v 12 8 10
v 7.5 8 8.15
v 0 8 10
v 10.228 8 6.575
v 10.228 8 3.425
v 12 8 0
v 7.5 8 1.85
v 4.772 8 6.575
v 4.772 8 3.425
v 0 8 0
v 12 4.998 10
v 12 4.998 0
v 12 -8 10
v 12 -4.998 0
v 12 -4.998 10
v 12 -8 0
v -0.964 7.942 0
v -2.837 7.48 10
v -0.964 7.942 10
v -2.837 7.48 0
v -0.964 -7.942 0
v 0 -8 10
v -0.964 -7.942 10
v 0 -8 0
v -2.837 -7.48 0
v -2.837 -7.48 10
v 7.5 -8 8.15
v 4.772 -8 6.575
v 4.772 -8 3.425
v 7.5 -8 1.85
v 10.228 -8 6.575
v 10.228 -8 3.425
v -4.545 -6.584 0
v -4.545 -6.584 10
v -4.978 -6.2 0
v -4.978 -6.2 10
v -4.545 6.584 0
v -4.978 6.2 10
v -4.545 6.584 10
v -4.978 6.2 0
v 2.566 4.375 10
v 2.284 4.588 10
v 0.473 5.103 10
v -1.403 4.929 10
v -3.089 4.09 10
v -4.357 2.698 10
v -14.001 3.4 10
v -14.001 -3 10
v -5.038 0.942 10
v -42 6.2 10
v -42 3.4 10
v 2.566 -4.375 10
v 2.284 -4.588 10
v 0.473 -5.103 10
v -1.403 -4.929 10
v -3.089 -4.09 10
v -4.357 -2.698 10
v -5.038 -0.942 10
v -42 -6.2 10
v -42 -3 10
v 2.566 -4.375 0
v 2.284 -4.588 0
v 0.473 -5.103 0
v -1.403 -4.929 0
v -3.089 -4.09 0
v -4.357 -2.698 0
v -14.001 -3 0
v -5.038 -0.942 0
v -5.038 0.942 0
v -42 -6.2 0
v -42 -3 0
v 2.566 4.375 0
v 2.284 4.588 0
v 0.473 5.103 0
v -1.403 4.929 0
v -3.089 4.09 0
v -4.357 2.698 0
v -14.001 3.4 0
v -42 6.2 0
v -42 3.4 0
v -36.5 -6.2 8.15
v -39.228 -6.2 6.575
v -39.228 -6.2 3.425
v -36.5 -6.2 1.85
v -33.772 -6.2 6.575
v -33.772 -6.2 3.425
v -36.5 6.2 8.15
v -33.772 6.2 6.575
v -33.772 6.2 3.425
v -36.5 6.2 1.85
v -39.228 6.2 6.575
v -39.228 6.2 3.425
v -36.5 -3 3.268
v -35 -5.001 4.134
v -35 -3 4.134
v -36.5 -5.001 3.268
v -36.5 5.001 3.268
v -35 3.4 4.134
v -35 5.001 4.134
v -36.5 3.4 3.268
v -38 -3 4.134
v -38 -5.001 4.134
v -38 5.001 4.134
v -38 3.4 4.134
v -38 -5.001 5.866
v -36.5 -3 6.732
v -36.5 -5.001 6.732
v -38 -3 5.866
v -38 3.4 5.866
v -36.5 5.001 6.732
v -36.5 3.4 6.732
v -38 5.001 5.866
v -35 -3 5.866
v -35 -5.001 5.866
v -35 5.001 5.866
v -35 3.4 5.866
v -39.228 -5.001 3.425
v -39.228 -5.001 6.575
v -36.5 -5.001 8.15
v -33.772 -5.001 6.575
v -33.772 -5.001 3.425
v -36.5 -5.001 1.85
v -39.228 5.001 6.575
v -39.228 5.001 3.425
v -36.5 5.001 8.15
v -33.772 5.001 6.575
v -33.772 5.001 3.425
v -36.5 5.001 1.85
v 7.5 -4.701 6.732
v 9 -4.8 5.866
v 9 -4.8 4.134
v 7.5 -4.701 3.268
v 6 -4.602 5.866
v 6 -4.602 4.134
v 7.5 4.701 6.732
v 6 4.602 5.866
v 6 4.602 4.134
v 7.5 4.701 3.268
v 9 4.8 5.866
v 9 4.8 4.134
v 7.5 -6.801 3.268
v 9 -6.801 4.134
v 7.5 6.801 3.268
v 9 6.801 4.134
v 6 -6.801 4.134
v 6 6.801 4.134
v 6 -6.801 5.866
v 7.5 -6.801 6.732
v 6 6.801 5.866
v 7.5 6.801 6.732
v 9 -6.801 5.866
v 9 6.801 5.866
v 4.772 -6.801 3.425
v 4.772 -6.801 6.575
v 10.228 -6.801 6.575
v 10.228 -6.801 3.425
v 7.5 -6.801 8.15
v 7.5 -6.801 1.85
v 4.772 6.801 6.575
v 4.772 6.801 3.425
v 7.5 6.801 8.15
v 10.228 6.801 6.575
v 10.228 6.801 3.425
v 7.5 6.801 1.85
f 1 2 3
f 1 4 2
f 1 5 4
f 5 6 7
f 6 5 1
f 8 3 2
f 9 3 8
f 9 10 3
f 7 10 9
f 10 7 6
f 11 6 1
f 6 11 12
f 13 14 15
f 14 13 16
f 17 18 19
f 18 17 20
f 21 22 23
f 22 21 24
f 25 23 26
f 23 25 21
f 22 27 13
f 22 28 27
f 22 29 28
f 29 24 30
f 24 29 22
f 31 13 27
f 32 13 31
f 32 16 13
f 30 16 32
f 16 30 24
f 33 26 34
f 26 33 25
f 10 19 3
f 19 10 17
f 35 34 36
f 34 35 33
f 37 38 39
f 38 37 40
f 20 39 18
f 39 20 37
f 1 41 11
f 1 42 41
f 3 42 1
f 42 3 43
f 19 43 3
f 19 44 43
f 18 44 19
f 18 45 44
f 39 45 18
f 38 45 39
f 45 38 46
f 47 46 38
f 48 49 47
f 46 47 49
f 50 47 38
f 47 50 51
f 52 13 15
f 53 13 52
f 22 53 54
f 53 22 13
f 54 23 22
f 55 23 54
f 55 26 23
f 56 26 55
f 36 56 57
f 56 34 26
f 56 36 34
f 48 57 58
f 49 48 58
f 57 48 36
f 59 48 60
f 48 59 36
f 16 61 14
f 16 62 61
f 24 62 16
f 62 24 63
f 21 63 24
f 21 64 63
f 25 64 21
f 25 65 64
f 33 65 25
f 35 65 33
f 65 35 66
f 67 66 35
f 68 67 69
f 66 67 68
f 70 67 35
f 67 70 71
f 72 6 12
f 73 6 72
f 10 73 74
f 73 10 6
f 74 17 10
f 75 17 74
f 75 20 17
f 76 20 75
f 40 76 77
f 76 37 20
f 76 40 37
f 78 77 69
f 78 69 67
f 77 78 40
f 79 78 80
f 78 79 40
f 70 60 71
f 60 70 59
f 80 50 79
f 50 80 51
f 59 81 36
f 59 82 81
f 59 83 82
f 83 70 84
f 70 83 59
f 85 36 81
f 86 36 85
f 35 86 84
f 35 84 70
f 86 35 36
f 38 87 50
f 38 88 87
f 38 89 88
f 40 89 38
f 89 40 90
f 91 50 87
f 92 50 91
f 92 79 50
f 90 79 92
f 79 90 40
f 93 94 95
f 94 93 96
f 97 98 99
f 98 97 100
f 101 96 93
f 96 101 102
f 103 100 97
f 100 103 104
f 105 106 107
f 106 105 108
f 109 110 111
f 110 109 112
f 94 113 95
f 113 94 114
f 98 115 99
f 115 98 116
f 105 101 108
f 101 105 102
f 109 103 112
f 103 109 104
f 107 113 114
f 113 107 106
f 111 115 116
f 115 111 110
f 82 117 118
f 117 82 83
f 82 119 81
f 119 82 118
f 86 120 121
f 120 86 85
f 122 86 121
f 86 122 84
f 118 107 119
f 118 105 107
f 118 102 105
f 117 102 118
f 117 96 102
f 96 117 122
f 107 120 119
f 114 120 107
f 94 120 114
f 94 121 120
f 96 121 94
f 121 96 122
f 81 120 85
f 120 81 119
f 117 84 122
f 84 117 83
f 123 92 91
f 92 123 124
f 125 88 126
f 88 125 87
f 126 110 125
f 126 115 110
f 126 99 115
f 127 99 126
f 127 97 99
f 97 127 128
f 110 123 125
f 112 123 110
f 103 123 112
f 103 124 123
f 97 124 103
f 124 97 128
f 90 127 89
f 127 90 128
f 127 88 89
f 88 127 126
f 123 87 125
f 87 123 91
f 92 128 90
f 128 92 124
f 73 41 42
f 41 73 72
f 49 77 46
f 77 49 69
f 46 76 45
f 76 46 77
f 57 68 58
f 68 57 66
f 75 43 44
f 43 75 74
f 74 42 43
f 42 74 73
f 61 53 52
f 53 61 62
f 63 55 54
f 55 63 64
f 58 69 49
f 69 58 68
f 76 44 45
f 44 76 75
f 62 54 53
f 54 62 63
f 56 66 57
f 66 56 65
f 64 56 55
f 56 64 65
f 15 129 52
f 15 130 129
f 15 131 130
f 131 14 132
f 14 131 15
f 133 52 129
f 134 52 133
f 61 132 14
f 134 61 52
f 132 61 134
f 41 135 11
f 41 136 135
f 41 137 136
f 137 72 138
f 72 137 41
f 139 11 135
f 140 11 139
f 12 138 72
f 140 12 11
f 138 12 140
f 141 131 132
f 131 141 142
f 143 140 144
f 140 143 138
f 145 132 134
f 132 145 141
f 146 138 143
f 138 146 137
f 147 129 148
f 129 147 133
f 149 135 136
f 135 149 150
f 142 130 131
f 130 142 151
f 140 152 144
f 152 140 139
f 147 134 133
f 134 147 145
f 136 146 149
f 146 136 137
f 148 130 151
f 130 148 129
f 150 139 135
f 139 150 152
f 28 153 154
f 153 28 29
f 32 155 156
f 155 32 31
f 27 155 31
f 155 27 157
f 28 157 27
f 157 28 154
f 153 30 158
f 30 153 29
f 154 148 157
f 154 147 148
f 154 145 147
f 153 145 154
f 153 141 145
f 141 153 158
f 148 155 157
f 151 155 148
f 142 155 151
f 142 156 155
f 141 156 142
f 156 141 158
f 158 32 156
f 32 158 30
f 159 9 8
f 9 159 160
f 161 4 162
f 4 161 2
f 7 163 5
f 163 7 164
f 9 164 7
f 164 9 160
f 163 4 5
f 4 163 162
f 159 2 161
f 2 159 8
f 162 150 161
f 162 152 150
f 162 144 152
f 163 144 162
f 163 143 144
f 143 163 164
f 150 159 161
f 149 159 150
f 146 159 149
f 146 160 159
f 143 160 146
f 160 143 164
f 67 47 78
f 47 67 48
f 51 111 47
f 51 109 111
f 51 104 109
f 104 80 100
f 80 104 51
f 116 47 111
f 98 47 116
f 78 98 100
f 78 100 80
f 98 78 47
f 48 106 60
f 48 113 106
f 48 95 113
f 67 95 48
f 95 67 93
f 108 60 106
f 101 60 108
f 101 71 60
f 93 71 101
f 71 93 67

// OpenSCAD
// file: common_dimensions.scad
x_rod_distance = 45;

thinwall = 3;

belt_width = 6;
belt_thickness = 1.5;

// Account for idler bearing and stepper pinion being different diameters
x_stepper_pinion_od = 12.0;
x_idler_bearing_od = 9.8; // 608 bearing
x_idler_bearing_id = 3.0; // 608 bearing
x_idler_bearing_width = 8.5; // 608 bearing
x_idler_to_stepper_offset = (x_stepper_pinion_od-x_idler_bearing_od)/2; 


// T8 NUT dimensions
t8nut_od = 22.0;
t8nut_id = 10.25; // 10.25; // 10.25 actual, 12.0 for spring on anti-backlash nut
t8nut_id_clearance = 14.0 + 3; // 
//t8nut_id = 10.2; //10.2 actual

// Z rod/bearing dimensions
z_rod_diam = 10.0; 
z_rod_diam_tight = z_rod_diam - 0.07; // Adjust diam based on test prints
z_bearing_diam = 19.0; // LM10UU
z_bearing_length = 29.0; // LM10UU

// X rod/bearing dimensions
x_rod_diam = 10.0; 
x_rod_diam_tight = x_rod_diam - 0.07; // Adjust tightness based on test prints
x_bearing_diam = 19.0; // LM10UU
x_bearing_length = 29.0; // LM10UU

z_bottom_wall_width = 5;
z_bottom_width = 43 + 2*z_bottom_wall_width;
z_bottom_height = 43;

z_top_wall_width = 5;
z_top_width = 30;
z_top_height = 22;
z_top_generate_rod_holder = false; // Optionally generate a Z rod holder, which limits the length of the Z rod, or no holder, which allows a longer Z rod to be used.

// Outer diam of Z bearing holders in X base.  

//z_bearing_size = z_bearing_diam + 2 * thinwall; // For discrete bearings, include wall to hold bearings
z_bearing_size = z_bearing_diam; // For PTFE bearings, don't need supportive walls

// Clearance required Z leadscrew to avoid interference.  Potential interference from leadscrew nut, 
// leadscrew anti-backlash spring/nut, motor/leadscrew coupler, etc.
z_leadscrew_clearance = 25+3; // Leadscrew coupler is 25mm

z_motor_ofs = z_bearing_size/2 + z_leadscrew_clearance/2; //17; // Z-motor offset from Z-rod (center-to-center) - both are aligned with X axis


x_end_belt_hole_height = x_rod_distance-x_rod_diam-2*thinwall; //31-5; // To fit between NEMA17 mounting screws
x_end_belt_hole_width = x_idler_bearing_width+0.5; // x_end_base_depth-2*thinwall; // 10;
x_end_base_height = x_rod_distance + x_rod_diam + 2*thinwall; //58 + 10;
x_end_base_depth = x_end_belt_hole_width + 2*thinwall; //18; //17; // NOTE: Manually adjust to prevent X rod cutout interference with Z linear bearing cutouts
x_end_base_width = z_bearing_size + z_leadscrew_clearance/2;
x_end_idler_open_end = true; // Specify whether x-idler end has closed ends with tension screws, or straight rod cutouts to allow longer rods.

z_rod_to_base = z_leadscrew_clearance/2; // Z-rod center offset from x-end front face
z_rod_to_rail = z_rod_to_base + x_end_base_depth + 3; // Z-rod center (and X-axis) offset from 3030 rail front face - dictated by NEMA17 stepper center (44mm / side)
z_beam_motor_ofs = 43+1-z_bottom_wall_width-25; // Z-rod center offset from Z beam center

x_to_z_offset = x_end_base_depth/2+z_rod_to_base; // 15; // Used to offset the X pushrods/belt from the Z rod.


y_rod_diam = 10.0;
y_rod_diam_tight = y_rod_diam - 0.0; // Adjust tightness based on test prints
y_rod_to_rail = 2*thinwall + y_rod_diam/2; // y rod center to 3030 rail.  11+4 from Haribo holder with 8mm rod. Use 2x thinwall to give room for ziptie hole.
y_rod_screw_diam = 3.0;

// 16T gt2 bearing
y_idler_bearing_od = 9.8; 
y_idler_bearing_id = 3.0; 
y_idler_bearing_width = 8.5; 

// Dimensions of the Y beltholder component (the sliding piece)
y_beltholder_width = 18;
y_beltholder_height = 2 + 9 + 2;
y_beltholder_depth = 6 + 2;

// Dimensions of the Y beltholder base component (that mounts to the plate)
y_beltholder_base_height = 9 + y_beltholder_height + 2;
y_beltholder_base_width = 2*y_beltholder_width + 10;
y_beltholder_base_depth = y_beltholder_depth + 8;

y_belt_to_plate = 9 + y_beltholder_height/2;
y_idler_to_plate = y_belt_to_plate + y_idler_bearing_od/2;

//y_plate_to_belt = 2*thinwall; // Bottom of plate to top of belt

y_bearing_od = 19.0; // LM10uu
y_bearing_length = 29.0; // LM10uu

y_bearing_holder_width = 50;
y_bearing_holder_depth = y_bearing_length;
y_bearing_holder_rod_ofs = thinwall*2 + y_bearing_od/2; // Offset from Y rod to mounting plate.  Use 2x thinwall to give room for ziptie hole.
y_bearing_holder_height = y_bearing_holder_rod_ofs+y_bearing_od*0.25;

y_rail_to_plate = y_rod_to_rail + y_bearing_holder_rod_ofs; // Offset from top of 3030 rail to bottom of mounting plate
y_rail_to_idler = y_rail_to_plate - y_idler_to_plate; // Offset from top of 3030 rail to center of idler (and stepper)

z_beam_width = 25;
z_railguide_width = 6.5; //8.30; // 3030
z_railguide_depth = 2.0;
z_railguide_keepout = 12; // 3030 dropin nut is 11, plus margin

x_beam_width = 25;
x_railguide_width = 6.5; //8.30; // 3030
x_railguide_depth = 2.0;
x_railguide_keepout = 12; // 3030 dropin nut is 11, plus margin
// main file
// PRUSA Mendel
// 10mm bar Endstop holder
// Used to attach endstops to 10mm rods
// GNU GPL v3
// Peter Ellens
// Based on endstop_holder.scad by
// Josef Pru�a
// josefprusa@me.com
// prusadjs.cz
// http://www.reprap.org/wiki/Prusa_Mendel
// http://github.com/prusajr/PrusaMendel

include <common_dimensions.scad>

z_endstop_height = ceil(6.3+3);
z_endstop_width  = z_rod_diam+2*thinwall;

z_endstop();
%translate([0,0,-1]) cylinder(d=z_rod_diam, h=z_endstop_height+2);

//x_base_screwholder();

module z_endstop_base() {
    hull() {
        cylinder(d=z_endstop_width, h=z_endstop_height);
        translate([0,-z_endstop_width/2,0]) cube([z_rod_diam/2+7,z_endstop_width,z_endstop_height]);
    }
    
    translate([0,thinwall+3.2,0]) rotate([0,0,180]) cube([20+1+5+8+z_endstop_width/2,thinwall+6.4+thinwall,z_endstop_height]);
}

module z_endstop_holes() {
    // rod hole
    translate([0,0,-1]) cylinder(d=z_rod_diam+0.25, h=z_endstop_height+2);
    
    // slide-in slot
    translate([0,0,-1]) hull() {
        cylinder(d=z_rod_diam-1.5, h=z_endstop_height+2);
        translate([z_rod_diam/2+10,0,0]) cylinder(d=z_rod_diam+0.5, h=z_endstop_height+2);
    }
    
    // m3 screw/nut to tighten against rod
    %translate([z_rod_diam/2+3.0/2+1,0,z_endstop_height/2]) rotate([0,90,90]) cylinder(d=3.0/cos(180/6), h=z_endstop_width*2, $fn=6, center=true);
    translate([z_rod_diam/2+3.0/2+1,0,z_endstop_height/2]) rotate([0,90,90]) cylinder(d=3.0/cos(180/6), h=z_endstop_width*2, $fn=6, center=true);
    translate([z_rod_diam/2+3.0/2+1,-(z_endstop_width/2+0.001),z_endstop_height/2]) rotate([-90,-90,0]) cylinder(d=6.3, h=1.2, $fn=6, center=false);
    translate([z_rod_diam/2+3.0/2+1,+(z_endstop_width/2+0.001),z_endstop_height/2]) rotate([+90,+90,0]) cylinder(d=6.3, h=1.2, $fn=6, center=false);

    // mounting holes for switch.  
    // Holes: 3/32 (2.5mm), 3/8 spacing, 3mm from bottom
    // Dimensions: 20.25mm x 10mm x 6.4mm
    %for(i=[-1,1]) translate([i*(3/8*25.4)/2-(10+1+5+z_endstop_width/2),0,3.0]) rotate([0,90,90]) cylinder(d=3/32*25.4/cos(180/6), h=z_endstop_width*2, $fn=6, center=true);

    %translate([-(20+1+5+8)-0.001,-thinwall,-1]) cube([20,6.4,z_endstop_height+2]);
    translate([-(20+1+5+8)-8-0.001,-thinwall,-1]) cube([20+8,6.4,z_endstop_height+2]);

    translate([-(20+1+5+8)-2.5,0,0]) {
        %translate([0,0,z_endstop_height/2]) rotate([0,90,90]) cylinder(d=3.0/cos(180/6), h=z_endstop_width*2, $fn=6, center=true);
        translate([0,0,z_endstop_height/2]) rotate([0,90,90]) cylinder(d=3.0/cos(180/6), h=z_endstop_width*2, $fn=6, center=true);
        translate([0,-(3.2+thinwall+0.001),z_endstop_height/2]) rotate([-90,-90,0]) cylinder(d=6.3, h=1.2, $fn=6, center=false);
        translate([0,+(3.2+thinwall+0.001),z_endstop_height/2]) rotate([+90,+90,0]) cylinder(d=6.3, h=1.2, $fn=6, center=false);
    }
}

module z_endstop() {
    difference() {
        z_endstop_base();
        z_endstop_holes();
    }
}


module x_base_screwholder() {
    difference() {
        hull() {
            cylinder(d=25,h=10);
            translate([0,5,0]) cylinder(d=25,h=10);
            translate([25/2+3,0,0]) cylinder(d=10, h=3);
        }
        translate([0,0,-1]) union() {
            translate([-12.501,0,0]) cube([25,25,10+2]);
            cylinder(d=25.002,h=10+2);
        }

        translate([25/2+3,0,0]) cylinder(d=3.0, h=100, $fn=6, center=true);
        
        translate([0,0,3]) hull() {
            translate([0,0,0]) cylinder(d=6.5, h=100, $fn=30);
            translate([25/2+3,0,0]) cylinder(d=6.5, h=100, $fn=30);
        }

    }
}
